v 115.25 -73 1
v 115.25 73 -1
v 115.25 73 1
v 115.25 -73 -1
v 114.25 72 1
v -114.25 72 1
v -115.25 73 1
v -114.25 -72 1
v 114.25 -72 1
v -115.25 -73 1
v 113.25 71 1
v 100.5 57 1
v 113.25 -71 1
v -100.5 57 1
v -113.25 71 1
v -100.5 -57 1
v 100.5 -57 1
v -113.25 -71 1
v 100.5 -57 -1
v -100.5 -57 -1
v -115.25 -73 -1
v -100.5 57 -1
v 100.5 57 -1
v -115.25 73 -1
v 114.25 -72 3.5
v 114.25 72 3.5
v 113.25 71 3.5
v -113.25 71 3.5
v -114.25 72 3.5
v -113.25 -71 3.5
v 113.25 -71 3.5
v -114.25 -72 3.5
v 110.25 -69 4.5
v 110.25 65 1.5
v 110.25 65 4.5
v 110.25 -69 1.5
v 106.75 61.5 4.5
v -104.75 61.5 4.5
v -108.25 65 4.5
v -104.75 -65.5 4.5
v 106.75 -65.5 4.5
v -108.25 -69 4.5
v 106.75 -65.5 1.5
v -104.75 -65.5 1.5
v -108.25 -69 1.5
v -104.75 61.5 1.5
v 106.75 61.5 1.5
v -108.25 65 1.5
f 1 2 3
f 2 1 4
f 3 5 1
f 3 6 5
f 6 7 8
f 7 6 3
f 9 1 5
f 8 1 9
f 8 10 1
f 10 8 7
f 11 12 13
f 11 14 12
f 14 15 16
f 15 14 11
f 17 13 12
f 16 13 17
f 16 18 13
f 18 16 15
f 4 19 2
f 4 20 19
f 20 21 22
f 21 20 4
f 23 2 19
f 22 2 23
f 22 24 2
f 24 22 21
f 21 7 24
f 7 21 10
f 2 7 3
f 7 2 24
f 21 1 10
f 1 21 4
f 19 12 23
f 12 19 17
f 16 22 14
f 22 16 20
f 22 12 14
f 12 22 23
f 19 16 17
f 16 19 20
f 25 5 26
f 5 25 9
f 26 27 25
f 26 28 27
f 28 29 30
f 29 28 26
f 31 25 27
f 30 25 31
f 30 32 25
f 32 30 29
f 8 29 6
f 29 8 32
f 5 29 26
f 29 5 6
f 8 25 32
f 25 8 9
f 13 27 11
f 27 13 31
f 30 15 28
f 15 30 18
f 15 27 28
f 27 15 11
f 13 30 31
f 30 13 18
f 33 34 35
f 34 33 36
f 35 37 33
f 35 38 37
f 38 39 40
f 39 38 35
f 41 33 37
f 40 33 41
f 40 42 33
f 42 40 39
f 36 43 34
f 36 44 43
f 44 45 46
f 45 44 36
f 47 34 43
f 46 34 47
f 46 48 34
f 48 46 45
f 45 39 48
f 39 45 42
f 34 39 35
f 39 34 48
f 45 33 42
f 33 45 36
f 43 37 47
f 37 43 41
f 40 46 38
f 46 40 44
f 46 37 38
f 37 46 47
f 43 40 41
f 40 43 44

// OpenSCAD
lcd_width=210.5;                    //Overall LCD Panel Width
lcd_height=126;                     //Overall LCD Panel Height
lcd_depth=3;                        //Overall height of the LCD Panel
lcd_viewport_width=201;             //Width of viewable screen
lcd_viewport_height=114;            //Height of viewable screen
lcd_surround_width=20;              //Total Width of Surround 
lcd_left_margin=3.5;                //Width of the margin on the left of the LCD Panel
lcd_right_margin=6;                 //Width of the margin on the right side of the LCD Panel
lcd_top_margin=3;                   //Width of top margin of the LCD Panel
lcd_bottom_margin=8.5;              //Width of bottom margin of the LCD Panel
wall_thickness=2;

outside_width=lcd_width + lcd_surround_width;
outside_height=lcd_height + lcd_surround_width;
inside_width=outside_width - wall_thickness;
inside_height=outside_height - wall_thickness;

module lid()
{
    //Main surface
    difference() {
        cube([outside_width, outside_height, wall_thickness], true);
        cube([lcd_viewport_width, lcd_viewport_height, 5], true);
    }
    
    //Box Lip
    difference() {
        translate([0,0,wall_thickness])
        cube([outside_width-2, outside_height-2, 3], true);
        translate([0,0,0])
        cube([outside_width-(wall_thickness*2), outside_height-(wall_thickness*2), 10], true);
    }
    
    //LCD Lip
    difference() {
        translate([1,-2,lcd_depth]) 
            color([1,0,0]) cube([lcd_width+(wall_thickness*4), lcd_height+(wall_thickness*4), 3],true);
        translate([1,-2,lcd_depth])
            cube([lcd_width+1, lcd_height+1, 20], true);
    }
    
}

module lcd_model()
{
    color([0,0,1]) cube([lcd_width, lcd_height, lcd_depth]);
    translate([lcd_left_margin,lcd_top_margin,lcd_depth]) color([0,1,0]) cube([lcd_viewport_width, lcd_viewport_height, .5]);
}


lid();
//show the LCD Model slightly hovering to try and get the lip right
//translate([(-lcd_width/2)+1,(lcd_height/2)-lcd_top_margin,lcd_depth+(wall_thickness/2)+7]) rotate([180,0,0]) lcd_model();
